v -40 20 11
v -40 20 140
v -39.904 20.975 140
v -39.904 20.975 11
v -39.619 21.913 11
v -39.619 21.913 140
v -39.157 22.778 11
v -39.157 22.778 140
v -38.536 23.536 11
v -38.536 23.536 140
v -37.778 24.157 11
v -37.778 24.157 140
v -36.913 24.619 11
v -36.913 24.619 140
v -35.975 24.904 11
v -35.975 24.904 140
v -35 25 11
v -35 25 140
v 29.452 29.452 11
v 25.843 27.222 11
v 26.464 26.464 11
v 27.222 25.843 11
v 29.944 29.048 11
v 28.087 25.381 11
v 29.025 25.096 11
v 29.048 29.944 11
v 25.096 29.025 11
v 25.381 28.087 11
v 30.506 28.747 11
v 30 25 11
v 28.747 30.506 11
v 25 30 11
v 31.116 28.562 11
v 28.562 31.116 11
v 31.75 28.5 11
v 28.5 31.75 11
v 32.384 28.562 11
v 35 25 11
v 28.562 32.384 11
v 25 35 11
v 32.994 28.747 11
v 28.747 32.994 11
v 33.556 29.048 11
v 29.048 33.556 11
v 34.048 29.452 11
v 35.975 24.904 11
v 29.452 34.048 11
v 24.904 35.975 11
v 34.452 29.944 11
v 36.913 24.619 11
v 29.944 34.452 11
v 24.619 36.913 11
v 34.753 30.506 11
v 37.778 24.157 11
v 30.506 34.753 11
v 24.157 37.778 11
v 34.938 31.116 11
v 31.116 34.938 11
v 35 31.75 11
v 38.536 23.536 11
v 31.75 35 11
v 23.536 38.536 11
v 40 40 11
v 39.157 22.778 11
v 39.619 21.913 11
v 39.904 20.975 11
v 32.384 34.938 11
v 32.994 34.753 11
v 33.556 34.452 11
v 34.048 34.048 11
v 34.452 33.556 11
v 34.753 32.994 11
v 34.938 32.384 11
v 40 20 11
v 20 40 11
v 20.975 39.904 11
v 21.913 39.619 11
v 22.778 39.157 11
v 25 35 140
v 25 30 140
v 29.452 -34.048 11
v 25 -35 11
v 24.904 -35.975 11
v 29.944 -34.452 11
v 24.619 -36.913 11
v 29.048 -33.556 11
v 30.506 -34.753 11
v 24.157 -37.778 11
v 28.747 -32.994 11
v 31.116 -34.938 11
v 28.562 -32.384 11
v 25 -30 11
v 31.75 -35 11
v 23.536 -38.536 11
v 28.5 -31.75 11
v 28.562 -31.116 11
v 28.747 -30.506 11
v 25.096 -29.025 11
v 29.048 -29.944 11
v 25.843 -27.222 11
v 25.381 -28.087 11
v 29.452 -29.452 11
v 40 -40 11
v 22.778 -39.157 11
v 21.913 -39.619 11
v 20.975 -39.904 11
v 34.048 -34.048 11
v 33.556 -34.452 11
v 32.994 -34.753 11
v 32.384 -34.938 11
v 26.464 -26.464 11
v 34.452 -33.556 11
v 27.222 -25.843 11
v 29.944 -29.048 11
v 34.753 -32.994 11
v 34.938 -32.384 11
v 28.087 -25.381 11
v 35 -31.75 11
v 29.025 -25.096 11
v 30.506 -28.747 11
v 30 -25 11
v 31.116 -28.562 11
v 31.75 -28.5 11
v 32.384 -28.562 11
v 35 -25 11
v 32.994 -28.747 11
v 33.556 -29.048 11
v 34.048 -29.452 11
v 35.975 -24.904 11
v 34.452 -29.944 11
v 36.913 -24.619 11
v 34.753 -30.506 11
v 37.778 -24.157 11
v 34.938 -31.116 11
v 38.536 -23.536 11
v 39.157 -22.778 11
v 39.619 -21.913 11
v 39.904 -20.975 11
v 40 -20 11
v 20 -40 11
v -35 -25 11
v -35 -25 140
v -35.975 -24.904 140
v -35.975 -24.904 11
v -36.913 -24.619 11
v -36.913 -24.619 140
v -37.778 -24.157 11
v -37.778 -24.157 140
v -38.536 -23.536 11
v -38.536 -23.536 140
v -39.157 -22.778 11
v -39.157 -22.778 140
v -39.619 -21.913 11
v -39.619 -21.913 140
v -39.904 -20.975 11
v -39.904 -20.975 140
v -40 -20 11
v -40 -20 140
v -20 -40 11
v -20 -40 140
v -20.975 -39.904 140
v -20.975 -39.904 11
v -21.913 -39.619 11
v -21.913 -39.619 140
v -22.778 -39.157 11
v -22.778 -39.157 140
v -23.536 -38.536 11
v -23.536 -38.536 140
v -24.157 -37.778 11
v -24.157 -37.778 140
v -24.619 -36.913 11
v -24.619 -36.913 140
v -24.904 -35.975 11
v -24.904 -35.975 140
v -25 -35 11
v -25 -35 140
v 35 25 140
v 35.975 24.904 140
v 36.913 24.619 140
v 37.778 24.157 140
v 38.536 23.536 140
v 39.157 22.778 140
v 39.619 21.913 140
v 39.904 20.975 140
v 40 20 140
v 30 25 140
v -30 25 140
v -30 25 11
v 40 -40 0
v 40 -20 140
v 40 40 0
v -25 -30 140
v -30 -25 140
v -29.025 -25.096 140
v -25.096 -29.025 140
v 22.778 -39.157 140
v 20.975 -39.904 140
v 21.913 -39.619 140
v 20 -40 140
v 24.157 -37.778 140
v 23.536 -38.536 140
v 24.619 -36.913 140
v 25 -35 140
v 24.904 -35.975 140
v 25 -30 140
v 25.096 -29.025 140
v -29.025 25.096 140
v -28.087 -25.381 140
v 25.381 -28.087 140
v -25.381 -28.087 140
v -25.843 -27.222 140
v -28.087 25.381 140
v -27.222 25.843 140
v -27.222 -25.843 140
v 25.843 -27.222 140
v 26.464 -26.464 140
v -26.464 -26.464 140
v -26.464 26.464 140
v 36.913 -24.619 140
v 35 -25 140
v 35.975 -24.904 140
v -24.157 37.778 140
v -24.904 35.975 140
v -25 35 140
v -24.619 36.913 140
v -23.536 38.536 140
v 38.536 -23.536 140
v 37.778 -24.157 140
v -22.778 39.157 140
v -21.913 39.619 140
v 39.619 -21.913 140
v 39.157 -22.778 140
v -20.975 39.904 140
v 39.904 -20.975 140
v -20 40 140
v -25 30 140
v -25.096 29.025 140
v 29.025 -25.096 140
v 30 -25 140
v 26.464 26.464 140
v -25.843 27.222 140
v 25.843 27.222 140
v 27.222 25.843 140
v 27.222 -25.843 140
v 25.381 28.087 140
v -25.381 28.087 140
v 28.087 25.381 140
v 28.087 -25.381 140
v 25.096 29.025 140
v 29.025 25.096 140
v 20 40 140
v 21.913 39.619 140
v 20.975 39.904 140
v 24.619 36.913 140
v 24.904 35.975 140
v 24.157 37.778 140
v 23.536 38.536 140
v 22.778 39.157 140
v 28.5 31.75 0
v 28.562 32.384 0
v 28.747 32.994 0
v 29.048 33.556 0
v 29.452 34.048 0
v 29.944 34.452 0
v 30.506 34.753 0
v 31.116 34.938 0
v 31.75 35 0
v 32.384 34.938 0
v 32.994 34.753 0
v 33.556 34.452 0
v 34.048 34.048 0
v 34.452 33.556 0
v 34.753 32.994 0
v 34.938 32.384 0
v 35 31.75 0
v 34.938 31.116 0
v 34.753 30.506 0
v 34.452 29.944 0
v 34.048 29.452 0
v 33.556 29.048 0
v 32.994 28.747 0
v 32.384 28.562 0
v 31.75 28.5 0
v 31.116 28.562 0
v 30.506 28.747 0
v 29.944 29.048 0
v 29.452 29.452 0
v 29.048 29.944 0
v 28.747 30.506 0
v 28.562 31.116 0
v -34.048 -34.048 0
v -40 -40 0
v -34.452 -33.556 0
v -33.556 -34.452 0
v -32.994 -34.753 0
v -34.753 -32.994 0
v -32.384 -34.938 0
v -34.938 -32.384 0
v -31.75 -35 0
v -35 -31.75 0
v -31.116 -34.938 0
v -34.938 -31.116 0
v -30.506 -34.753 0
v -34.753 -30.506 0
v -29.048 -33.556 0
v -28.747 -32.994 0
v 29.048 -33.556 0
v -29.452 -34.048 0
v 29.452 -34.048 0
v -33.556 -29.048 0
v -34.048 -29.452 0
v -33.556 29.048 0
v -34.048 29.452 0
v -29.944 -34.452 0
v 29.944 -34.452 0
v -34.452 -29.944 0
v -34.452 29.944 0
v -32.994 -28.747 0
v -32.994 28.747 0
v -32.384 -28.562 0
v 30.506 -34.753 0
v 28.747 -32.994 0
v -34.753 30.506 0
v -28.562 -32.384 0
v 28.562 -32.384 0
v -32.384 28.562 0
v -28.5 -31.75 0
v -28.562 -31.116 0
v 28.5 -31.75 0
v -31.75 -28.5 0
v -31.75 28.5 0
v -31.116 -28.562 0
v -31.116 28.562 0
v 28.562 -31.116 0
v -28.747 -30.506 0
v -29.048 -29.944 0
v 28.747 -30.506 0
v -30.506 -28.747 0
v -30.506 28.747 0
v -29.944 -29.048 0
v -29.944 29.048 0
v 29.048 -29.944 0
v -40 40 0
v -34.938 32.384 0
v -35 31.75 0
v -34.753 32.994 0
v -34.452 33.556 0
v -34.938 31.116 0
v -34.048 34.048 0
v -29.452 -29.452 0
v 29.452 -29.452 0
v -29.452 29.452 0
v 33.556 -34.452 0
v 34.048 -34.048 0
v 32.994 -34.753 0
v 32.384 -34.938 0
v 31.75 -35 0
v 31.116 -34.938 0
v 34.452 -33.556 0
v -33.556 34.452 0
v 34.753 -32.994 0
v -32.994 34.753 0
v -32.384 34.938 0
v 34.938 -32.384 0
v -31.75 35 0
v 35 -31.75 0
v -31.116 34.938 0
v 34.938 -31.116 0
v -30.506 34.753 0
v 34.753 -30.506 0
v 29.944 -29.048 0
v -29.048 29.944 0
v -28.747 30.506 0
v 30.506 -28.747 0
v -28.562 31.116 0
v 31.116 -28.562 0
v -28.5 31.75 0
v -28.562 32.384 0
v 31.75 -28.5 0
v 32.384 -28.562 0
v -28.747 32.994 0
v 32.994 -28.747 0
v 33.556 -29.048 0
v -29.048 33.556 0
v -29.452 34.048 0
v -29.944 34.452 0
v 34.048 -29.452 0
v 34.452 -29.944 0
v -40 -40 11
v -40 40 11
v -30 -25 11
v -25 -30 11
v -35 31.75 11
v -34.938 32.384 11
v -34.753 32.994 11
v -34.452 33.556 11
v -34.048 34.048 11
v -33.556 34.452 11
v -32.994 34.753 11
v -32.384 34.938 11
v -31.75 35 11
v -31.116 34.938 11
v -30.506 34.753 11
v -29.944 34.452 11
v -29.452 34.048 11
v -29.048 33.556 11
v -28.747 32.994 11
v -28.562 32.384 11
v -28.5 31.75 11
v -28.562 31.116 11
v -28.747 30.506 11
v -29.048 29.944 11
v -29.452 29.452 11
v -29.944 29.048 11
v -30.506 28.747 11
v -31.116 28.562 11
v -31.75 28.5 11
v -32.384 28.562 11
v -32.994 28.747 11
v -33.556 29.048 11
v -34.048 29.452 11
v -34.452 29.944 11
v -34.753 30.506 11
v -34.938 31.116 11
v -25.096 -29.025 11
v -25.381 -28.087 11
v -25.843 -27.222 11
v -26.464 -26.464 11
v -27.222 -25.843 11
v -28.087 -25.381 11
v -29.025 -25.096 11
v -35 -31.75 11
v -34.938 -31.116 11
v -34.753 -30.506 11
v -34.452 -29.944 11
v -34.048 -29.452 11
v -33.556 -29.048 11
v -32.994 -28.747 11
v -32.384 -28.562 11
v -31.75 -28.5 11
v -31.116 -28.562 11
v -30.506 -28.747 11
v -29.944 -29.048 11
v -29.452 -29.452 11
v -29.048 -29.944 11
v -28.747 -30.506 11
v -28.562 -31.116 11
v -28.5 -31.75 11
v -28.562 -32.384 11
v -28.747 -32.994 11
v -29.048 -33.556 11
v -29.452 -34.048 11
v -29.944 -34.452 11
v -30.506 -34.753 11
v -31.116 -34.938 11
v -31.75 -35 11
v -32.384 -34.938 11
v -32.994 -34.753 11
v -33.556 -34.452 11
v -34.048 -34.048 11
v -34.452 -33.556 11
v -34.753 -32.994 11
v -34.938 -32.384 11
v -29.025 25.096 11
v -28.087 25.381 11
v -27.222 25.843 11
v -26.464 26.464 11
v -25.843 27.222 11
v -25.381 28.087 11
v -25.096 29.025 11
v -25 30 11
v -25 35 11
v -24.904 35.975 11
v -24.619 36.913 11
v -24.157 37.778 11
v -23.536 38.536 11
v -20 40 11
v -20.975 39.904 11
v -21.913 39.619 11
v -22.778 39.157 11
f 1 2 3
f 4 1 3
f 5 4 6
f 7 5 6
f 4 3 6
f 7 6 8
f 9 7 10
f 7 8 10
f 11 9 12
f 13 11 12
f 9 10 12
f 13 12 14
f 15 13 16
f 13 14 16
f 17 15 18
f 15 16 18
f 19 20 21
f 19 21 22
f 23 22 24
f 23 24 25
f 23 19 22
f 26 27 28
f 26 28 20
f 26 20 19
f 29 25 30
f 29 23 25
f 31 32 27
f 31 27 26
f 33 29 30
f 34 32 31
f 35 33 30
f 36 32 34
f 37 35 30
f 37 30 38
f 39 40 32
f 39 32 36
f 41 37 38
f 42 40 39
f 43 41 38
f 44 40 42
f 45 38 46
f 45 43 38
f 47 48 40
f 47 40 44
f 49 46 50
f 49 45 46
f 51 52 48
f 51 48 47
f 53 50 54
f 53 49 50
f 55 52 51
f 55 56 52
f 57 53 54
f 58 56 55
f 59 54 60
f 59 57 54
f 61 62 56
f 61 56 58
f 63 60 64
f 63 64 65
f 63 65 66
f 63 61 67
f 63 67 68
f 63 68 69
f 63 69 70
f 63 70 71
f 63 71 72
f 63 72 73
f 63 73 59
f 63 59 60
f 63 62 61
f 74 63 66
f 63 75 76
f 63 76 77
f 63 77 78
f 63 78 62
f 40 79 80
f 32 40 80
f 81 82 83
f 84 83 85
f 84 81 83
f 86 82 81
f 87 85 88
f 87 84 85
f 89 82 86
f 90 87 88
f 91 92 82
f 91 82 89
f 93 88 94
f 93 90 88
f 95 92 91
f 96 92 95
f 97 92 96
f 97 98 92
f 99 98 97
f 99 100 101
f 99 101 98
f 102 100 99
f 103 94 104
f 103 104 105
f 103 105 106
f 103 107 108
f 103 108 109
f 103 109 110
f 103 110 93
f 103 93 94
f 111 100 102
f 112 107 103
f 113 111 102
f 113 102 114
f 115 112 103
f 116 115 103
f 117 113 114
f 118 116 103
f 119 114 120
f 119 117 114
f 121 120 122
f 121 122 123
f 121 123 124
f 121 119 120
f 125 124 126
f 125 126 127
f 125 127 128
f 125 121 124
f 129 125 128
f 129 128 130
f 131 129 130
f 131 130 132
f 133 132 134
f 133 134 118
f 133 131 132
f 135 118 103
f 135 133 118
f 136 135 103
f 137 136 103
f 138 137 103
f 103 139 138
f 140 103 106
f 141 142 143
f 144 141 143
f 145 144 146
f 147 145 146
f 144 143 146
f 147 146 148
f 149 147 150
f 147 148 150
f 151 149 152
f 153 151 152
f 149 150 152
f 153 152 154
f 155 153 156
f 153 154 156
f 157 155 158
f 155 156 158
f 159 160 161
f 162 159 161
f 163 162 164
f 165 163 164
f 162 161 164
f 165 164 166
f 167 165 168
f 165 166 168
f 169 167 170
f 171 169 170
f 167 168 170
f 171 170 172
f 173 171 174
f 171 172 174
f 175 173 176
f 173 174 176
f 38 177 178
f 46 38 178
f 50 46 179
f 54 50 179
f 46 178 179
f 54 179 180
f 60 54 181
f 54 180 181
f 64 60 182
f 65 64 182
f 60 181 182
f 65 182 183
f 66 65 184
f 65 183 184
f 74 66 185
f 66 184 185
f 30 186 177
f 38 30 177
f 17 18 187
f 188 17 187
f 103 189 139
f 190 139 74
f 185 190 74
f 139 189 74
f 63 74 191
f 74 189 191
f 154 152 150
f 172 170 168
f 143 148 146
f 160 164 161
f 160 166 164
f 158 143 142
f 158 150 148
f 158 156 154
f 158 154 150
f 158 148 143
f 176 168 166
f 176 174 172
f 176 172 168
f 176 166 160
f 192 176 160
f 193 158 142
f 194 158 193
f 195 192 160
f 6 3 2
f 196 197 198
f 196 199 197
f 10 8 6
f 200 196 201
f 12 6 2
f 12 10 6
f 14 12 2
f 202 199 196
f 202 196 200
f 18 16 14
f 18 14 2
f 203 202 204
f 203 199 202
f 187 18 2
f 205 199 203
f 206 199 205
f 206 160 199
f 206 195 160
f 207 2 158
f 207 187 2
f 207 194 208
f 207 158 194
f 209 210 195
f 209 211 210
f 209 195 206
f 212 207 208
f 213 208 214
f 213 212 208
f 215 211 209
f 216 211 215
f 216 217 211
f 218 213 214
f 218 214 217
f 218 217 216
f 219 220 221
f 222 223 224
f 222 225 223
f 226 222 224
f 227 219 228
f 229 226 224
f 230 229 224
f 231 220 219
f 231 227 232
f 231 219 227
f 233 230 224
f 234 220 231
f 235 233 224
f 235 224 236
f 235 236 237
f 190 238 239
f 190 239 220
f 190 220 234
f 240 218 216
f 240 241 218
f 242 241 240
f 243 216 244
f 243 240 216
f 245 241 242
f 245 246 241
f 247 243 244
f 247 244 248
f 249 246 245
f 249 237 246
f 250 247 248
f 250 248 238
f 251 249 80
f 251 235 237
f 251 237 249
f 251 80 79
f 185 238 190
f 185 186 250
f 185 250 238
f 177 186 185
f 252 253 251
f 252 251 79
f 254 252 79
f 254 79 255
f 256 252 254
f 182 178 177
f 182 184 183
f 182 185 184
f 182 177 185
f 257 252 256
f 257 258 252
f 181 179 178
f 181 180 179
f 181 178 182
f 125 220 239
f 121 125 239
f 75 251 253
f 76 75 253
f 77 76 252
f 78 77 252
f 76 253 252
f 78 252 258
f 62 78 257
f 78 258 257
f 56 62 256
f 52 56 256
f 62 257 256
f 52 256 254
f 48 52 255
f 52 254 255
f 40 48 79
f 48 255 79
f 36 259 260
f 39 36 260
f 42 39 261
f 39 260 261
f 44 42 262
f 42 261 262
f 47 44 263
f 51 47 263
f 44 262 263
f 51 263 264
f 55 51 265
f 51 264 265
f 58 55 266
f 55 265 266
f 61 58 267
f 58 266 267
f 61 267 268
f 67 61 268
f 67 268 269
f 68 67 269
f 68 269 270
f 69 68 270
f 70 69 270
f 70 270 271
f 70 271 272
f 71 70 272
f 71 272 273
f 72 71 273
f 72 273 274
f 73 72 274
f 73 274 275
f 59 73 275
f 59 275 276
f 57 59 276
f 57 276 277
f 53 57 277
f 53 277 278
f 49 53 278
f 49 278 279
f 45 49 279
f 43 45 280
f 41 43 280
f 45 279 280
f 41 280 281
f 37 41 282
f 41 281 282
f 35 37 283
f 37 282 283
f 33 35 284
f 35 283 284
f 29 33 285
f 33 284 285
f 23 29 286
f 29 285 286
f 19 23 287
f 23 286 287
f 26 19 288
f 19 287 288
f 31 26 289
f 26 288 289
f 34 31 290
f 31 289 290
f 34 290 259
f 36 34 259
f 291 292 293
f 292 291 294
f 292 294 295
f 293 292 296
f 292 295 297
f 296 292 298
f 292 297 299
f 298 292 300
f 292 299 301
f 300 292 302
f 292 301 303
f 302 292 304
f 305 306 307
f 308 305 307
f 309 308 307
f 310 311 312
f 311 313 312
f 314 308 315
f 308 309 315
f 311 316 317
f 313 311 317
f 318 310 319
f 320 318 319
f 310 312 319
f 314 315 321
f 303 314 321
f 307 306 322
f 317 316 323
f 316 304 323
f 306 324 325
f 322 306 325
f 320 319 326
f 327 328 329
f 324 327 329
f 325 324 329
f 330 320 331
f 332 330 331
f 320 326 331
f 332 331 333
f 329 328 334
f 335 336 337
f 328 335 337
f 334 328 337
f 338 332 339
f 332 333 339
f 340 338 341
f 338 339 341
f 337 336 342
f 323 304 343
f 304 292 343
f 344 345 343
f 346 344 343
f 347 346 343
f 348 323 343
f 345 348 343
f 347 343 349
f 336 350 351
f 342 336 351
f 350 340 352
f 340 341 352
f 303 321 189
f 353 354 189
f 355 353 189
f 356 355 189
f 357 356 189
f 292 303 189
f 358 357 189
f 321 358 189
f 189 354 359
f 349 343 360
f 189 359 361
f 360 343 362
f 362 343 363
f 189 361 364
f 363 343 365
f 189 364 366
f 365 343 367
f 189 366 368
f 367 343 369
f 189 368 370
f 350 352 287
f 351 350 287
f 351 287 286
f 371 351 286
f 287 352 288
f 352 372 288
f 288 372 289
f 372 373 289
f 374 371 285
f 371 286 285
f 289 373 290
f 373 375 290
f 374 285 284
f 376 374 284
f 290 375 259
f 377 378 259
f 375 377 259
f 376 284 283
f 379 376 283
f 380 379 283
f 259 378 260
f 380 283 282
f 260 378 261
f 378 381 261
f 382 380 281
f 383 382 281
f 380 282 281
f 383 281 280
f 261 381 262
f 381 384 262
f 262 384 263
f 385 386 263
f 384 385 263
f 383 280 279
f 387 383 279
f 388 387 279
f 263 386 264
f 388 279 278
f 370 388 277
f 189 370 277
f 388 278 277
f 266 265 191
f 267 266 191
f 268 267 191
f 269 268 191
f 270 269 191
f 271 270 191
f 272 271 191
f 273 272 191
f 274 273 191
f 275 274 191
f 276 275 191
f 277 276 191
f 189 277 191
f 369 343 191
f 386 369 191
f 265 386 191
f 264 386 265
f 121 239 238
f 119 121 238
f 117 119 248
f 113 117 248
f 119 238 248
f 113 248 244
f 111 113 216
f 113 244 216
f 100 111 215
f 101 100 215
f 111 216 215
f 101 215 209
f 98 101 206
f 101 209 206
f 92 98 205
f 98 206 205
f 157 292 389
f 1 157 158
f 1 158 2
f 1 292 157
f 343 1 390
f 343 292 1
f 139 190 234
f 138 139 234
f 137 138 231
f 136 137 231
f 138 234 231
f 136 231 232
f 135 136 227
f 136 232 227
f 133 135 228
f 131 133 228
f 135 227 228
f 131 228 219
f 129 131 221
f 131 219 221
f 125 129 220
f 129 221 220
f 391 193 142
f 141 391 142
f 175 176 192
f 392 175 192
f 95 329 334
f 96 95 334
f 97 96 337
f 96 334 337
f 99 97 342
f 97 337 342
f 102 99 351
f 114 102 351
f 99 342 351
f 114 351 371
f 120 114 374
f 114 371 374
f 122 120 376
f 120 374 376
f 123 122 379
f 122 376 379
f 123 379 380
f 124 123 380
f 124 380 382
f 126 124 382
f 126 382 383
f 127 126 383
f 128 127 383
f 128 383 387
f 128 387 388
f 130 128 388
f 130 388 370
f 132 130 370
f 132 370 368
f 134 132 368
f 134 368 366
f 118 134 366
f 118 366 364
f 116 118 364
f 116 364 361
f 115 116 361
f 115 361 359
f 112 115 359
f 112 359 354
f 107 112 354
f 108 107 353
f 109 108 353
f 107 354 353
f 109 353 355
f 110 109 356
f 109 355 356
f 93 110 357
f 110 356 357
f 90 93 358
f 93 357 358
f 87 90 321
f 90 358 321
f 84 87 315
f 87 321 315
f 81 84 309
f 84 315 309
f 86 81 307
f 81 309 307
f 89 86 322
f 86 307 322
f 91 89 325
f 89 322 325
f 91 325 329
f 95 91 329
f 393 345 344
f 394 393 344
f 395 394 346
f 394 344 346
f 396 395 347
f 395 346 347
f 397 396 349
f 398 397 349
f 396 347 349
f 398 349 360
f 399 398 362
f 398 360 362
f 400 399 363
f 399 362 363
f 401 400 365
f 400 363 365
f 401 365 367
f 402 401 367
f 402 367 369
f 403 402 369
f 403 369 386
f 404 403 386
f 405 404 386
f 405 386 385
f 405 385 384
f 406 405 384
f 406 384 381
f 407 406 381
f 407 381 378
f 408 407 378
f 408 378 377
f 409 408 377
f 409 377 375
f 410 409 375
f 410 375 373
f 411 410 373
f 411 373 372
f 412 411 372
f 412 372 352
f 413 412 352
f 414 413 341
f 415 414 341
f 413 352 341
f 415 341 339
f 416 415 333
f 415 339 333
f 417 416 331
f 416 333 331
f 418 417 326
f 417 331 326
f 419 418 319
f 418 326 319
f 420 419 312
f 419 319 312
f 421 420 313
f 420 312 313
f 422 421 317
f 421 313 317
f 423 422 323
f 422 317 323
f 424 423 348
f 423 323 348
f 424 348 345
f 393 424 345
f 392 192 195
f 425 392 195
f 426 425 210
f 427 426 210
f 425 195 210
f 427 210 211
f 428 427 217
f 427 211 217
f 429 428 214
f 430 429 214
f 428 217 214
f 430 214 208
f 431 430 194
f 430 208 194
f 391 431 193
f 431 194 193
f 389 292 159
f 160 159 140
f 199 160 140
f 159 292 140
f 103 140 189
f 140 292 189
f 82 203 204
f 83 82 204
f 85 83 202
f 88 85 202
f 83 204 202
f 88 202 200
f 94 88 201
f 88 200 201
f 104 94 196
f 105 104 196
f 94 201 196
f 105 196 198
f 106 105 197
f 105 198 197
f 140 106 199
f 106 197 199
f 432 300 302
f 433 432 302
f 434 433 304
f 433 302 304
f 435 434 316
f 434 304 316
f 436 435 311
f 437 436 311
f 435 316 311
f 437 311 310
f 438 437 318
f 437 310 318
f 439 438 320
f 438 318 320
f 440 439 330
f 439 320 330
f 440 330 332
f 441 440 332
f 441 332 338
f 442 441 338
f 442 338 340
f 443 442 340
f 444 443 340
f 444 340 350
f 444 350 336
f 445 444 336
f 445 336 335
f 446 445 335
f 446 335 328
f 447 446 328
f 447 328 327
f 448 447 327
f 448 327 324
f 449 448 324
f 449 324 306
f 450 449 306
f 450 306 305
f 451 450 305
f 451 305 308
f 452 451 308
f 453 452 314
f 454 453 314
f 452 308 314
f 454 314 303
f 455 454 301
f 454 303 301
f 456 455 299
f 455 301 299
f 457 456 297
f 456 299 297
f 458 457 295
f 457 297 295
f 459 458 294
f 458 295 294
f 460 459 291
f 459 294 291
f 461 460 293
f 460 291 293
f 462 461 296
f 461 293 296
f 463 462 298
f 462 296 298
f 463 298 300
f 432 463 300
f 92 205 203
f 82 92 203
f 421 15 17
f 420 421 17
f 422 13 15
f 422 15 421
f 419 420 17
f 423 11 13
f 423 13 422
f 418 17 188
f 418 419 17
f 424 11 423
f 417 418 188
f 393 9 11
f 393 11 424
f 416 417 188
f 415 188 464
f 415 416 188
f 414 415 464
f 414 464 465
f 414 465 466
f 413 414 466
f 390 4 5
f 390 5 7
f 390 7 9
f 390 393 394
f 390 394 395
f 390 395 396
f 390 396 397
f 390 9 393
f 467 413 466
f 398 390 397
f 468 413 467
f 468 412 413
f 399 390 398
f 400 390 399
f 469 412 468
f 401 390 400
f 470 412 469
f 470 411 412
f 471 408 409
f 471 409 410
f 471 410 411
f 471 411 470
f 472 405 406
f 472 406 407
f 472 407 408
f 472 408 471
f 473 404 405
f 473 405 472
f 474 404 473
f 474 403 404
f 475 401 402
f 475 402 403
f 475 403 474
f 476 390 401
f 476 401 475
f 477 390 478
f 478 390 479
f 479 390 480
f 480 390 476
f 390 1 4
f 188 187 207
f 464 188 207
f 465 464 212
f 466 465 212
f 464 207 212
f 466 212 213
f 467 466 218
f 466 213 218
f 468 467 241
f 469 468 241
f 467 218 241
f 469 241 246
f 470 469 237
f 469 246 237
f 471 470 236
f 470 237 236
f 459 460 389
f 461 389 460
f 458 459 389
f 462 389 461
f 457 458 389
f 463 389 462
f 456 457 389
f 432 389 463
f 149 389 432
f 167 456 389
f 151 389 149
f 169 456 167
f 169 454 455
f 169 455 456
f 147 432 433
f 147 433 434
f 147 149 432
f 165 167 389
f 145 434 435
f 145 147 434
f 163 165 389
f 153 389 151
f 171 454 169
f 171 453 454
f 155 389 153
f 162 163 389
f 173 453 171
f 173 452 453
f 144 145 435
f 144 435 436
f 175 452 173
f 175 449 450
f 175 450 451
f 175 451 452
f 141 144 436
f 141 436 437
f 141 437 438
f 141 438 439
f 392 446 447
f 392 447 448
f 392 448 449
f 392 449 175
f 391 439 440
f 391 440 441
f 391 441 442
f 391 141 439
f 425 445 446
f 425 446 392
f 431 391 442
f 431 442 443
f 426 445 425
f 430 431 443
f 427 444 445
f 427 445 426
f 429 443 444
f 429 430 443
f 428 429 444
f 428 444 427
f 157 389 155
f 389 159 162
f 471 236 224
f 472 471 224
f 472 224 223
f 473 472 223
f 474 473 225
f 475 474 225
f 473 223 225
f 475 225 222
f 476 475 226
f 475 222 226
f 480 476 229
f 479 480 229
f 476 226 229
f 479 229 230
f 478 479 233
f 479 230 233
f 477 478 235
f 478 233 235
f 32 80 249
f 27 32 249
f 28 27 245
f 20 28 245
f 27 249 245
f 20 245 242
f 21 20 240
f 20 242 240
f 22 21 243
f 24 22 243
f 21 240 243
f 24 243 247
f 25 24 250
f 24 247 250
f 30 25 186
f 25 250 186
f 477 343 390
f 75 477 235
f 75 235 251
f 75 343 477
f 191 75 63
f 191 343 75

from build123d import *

# Parameters (mm, degrees)
SKETCH_1_W              = 80
SKETCH_1_H              = 80
EXTRUDE_1_DEPTH         = 140
SKETCH_2_OUTSIDE_W      = 118
SKETCH_2_OUTSIDE_H      = 118
CUT_EXTRUDE_1_DEPTH     = 129
HOLE_WIZARD_6_5_6_5_1_D = 6.5


with BuildPart() as part:
    # 草图1 → 凸台-拉伸1 (new body)
    with BuildSketch(Plane.XY):
        Rectangle(SKETCH_1_W, SKETCH_1_H)
    extrude(amount=EXTRUDE_1_DEPTH)

    # 草图2 outside → 切除-拉伸1 (cut)
    with BuildSketch(Plane.XY.offset(140)):
        Rectangle(SKETCH_2_OUTSIDE_W, SKETCH_2_OUTSIDE_H)
        with BuildLine():
            Line((30, 25), (35, 25))
            ThreePointArc((35, 25), (38.535533906, 23.535533906), (40, 20))
            Line((40, 20), (40, -20))
            ThreePointArc((40, -20), (38.535533906, -23.535533906), (35, -25))
            Line((35, -25), (30, -25))
            ThreePointArc((30, -25), (26.464466094, -26.464466094), (25, -30))
            Line((25, -30), (25, -35))
            ThreePointArc((25, -35), (23.535533906, -38.535533906), (20, -40))
            Line((20, -40), (-20, -40))
            ThreePointArc((-20, -40), (-23.535533906, -38.535533906), (-25, -35))
            Line((-25, -35), (-25, -30))
            ThreePointArc((-25, -30), (-26.464466094, -26.464466094), (-30, -25))
            Line((-30, -25), (-35, -25))
            ThreePointArc((-35, -25), (-38.535533906, -23.535533906), (-40, -20))
            Line((-40, -20), (-40, 20))
            ThreePointArc((-40, 20), (-38.535533906, 23.535533906), (-35, 25))
            Line((-35, 25), (-30, 25))
            ThreePointArc((-30, 25), (-26.464466094, 26.464466094), (-25, 30))
            Line((-25, 30), (-25, 35))
            ThreePointArc((-25, 35), (-23.535533906, 38.535533906), (-20, 40))
            Line((-20, 40), (20, 40))
            ThreePointArc((20, 40), (23.535533906, 38.535533906), (25, 35))
            Line((25, 35), (25, 30))
            ThreePointArc((25, 30), (26.464466094, 26.464466094), (30, 25))
        make_face(mode=Mode.SUBTRACT)
    extrude(amount=-CUT_EXTRUDE_1_DEPTH, mode=Mode.SUBTRACT)

    # Ø6.5 (6.5) 直径孔1 (through all)
    with Locations(Plane(origin=(-31.75, 31.75, 11), x_dir=(1, 0, 0), z_dir=(0, 0, 1))):
        with Locations((0, 0), (63.5, 0), (63.5, -63.5), (0, -63.5)):
            Hole(HOLE_WIZARD_6_5_6_5_1_D / 2)


solid = part.part
